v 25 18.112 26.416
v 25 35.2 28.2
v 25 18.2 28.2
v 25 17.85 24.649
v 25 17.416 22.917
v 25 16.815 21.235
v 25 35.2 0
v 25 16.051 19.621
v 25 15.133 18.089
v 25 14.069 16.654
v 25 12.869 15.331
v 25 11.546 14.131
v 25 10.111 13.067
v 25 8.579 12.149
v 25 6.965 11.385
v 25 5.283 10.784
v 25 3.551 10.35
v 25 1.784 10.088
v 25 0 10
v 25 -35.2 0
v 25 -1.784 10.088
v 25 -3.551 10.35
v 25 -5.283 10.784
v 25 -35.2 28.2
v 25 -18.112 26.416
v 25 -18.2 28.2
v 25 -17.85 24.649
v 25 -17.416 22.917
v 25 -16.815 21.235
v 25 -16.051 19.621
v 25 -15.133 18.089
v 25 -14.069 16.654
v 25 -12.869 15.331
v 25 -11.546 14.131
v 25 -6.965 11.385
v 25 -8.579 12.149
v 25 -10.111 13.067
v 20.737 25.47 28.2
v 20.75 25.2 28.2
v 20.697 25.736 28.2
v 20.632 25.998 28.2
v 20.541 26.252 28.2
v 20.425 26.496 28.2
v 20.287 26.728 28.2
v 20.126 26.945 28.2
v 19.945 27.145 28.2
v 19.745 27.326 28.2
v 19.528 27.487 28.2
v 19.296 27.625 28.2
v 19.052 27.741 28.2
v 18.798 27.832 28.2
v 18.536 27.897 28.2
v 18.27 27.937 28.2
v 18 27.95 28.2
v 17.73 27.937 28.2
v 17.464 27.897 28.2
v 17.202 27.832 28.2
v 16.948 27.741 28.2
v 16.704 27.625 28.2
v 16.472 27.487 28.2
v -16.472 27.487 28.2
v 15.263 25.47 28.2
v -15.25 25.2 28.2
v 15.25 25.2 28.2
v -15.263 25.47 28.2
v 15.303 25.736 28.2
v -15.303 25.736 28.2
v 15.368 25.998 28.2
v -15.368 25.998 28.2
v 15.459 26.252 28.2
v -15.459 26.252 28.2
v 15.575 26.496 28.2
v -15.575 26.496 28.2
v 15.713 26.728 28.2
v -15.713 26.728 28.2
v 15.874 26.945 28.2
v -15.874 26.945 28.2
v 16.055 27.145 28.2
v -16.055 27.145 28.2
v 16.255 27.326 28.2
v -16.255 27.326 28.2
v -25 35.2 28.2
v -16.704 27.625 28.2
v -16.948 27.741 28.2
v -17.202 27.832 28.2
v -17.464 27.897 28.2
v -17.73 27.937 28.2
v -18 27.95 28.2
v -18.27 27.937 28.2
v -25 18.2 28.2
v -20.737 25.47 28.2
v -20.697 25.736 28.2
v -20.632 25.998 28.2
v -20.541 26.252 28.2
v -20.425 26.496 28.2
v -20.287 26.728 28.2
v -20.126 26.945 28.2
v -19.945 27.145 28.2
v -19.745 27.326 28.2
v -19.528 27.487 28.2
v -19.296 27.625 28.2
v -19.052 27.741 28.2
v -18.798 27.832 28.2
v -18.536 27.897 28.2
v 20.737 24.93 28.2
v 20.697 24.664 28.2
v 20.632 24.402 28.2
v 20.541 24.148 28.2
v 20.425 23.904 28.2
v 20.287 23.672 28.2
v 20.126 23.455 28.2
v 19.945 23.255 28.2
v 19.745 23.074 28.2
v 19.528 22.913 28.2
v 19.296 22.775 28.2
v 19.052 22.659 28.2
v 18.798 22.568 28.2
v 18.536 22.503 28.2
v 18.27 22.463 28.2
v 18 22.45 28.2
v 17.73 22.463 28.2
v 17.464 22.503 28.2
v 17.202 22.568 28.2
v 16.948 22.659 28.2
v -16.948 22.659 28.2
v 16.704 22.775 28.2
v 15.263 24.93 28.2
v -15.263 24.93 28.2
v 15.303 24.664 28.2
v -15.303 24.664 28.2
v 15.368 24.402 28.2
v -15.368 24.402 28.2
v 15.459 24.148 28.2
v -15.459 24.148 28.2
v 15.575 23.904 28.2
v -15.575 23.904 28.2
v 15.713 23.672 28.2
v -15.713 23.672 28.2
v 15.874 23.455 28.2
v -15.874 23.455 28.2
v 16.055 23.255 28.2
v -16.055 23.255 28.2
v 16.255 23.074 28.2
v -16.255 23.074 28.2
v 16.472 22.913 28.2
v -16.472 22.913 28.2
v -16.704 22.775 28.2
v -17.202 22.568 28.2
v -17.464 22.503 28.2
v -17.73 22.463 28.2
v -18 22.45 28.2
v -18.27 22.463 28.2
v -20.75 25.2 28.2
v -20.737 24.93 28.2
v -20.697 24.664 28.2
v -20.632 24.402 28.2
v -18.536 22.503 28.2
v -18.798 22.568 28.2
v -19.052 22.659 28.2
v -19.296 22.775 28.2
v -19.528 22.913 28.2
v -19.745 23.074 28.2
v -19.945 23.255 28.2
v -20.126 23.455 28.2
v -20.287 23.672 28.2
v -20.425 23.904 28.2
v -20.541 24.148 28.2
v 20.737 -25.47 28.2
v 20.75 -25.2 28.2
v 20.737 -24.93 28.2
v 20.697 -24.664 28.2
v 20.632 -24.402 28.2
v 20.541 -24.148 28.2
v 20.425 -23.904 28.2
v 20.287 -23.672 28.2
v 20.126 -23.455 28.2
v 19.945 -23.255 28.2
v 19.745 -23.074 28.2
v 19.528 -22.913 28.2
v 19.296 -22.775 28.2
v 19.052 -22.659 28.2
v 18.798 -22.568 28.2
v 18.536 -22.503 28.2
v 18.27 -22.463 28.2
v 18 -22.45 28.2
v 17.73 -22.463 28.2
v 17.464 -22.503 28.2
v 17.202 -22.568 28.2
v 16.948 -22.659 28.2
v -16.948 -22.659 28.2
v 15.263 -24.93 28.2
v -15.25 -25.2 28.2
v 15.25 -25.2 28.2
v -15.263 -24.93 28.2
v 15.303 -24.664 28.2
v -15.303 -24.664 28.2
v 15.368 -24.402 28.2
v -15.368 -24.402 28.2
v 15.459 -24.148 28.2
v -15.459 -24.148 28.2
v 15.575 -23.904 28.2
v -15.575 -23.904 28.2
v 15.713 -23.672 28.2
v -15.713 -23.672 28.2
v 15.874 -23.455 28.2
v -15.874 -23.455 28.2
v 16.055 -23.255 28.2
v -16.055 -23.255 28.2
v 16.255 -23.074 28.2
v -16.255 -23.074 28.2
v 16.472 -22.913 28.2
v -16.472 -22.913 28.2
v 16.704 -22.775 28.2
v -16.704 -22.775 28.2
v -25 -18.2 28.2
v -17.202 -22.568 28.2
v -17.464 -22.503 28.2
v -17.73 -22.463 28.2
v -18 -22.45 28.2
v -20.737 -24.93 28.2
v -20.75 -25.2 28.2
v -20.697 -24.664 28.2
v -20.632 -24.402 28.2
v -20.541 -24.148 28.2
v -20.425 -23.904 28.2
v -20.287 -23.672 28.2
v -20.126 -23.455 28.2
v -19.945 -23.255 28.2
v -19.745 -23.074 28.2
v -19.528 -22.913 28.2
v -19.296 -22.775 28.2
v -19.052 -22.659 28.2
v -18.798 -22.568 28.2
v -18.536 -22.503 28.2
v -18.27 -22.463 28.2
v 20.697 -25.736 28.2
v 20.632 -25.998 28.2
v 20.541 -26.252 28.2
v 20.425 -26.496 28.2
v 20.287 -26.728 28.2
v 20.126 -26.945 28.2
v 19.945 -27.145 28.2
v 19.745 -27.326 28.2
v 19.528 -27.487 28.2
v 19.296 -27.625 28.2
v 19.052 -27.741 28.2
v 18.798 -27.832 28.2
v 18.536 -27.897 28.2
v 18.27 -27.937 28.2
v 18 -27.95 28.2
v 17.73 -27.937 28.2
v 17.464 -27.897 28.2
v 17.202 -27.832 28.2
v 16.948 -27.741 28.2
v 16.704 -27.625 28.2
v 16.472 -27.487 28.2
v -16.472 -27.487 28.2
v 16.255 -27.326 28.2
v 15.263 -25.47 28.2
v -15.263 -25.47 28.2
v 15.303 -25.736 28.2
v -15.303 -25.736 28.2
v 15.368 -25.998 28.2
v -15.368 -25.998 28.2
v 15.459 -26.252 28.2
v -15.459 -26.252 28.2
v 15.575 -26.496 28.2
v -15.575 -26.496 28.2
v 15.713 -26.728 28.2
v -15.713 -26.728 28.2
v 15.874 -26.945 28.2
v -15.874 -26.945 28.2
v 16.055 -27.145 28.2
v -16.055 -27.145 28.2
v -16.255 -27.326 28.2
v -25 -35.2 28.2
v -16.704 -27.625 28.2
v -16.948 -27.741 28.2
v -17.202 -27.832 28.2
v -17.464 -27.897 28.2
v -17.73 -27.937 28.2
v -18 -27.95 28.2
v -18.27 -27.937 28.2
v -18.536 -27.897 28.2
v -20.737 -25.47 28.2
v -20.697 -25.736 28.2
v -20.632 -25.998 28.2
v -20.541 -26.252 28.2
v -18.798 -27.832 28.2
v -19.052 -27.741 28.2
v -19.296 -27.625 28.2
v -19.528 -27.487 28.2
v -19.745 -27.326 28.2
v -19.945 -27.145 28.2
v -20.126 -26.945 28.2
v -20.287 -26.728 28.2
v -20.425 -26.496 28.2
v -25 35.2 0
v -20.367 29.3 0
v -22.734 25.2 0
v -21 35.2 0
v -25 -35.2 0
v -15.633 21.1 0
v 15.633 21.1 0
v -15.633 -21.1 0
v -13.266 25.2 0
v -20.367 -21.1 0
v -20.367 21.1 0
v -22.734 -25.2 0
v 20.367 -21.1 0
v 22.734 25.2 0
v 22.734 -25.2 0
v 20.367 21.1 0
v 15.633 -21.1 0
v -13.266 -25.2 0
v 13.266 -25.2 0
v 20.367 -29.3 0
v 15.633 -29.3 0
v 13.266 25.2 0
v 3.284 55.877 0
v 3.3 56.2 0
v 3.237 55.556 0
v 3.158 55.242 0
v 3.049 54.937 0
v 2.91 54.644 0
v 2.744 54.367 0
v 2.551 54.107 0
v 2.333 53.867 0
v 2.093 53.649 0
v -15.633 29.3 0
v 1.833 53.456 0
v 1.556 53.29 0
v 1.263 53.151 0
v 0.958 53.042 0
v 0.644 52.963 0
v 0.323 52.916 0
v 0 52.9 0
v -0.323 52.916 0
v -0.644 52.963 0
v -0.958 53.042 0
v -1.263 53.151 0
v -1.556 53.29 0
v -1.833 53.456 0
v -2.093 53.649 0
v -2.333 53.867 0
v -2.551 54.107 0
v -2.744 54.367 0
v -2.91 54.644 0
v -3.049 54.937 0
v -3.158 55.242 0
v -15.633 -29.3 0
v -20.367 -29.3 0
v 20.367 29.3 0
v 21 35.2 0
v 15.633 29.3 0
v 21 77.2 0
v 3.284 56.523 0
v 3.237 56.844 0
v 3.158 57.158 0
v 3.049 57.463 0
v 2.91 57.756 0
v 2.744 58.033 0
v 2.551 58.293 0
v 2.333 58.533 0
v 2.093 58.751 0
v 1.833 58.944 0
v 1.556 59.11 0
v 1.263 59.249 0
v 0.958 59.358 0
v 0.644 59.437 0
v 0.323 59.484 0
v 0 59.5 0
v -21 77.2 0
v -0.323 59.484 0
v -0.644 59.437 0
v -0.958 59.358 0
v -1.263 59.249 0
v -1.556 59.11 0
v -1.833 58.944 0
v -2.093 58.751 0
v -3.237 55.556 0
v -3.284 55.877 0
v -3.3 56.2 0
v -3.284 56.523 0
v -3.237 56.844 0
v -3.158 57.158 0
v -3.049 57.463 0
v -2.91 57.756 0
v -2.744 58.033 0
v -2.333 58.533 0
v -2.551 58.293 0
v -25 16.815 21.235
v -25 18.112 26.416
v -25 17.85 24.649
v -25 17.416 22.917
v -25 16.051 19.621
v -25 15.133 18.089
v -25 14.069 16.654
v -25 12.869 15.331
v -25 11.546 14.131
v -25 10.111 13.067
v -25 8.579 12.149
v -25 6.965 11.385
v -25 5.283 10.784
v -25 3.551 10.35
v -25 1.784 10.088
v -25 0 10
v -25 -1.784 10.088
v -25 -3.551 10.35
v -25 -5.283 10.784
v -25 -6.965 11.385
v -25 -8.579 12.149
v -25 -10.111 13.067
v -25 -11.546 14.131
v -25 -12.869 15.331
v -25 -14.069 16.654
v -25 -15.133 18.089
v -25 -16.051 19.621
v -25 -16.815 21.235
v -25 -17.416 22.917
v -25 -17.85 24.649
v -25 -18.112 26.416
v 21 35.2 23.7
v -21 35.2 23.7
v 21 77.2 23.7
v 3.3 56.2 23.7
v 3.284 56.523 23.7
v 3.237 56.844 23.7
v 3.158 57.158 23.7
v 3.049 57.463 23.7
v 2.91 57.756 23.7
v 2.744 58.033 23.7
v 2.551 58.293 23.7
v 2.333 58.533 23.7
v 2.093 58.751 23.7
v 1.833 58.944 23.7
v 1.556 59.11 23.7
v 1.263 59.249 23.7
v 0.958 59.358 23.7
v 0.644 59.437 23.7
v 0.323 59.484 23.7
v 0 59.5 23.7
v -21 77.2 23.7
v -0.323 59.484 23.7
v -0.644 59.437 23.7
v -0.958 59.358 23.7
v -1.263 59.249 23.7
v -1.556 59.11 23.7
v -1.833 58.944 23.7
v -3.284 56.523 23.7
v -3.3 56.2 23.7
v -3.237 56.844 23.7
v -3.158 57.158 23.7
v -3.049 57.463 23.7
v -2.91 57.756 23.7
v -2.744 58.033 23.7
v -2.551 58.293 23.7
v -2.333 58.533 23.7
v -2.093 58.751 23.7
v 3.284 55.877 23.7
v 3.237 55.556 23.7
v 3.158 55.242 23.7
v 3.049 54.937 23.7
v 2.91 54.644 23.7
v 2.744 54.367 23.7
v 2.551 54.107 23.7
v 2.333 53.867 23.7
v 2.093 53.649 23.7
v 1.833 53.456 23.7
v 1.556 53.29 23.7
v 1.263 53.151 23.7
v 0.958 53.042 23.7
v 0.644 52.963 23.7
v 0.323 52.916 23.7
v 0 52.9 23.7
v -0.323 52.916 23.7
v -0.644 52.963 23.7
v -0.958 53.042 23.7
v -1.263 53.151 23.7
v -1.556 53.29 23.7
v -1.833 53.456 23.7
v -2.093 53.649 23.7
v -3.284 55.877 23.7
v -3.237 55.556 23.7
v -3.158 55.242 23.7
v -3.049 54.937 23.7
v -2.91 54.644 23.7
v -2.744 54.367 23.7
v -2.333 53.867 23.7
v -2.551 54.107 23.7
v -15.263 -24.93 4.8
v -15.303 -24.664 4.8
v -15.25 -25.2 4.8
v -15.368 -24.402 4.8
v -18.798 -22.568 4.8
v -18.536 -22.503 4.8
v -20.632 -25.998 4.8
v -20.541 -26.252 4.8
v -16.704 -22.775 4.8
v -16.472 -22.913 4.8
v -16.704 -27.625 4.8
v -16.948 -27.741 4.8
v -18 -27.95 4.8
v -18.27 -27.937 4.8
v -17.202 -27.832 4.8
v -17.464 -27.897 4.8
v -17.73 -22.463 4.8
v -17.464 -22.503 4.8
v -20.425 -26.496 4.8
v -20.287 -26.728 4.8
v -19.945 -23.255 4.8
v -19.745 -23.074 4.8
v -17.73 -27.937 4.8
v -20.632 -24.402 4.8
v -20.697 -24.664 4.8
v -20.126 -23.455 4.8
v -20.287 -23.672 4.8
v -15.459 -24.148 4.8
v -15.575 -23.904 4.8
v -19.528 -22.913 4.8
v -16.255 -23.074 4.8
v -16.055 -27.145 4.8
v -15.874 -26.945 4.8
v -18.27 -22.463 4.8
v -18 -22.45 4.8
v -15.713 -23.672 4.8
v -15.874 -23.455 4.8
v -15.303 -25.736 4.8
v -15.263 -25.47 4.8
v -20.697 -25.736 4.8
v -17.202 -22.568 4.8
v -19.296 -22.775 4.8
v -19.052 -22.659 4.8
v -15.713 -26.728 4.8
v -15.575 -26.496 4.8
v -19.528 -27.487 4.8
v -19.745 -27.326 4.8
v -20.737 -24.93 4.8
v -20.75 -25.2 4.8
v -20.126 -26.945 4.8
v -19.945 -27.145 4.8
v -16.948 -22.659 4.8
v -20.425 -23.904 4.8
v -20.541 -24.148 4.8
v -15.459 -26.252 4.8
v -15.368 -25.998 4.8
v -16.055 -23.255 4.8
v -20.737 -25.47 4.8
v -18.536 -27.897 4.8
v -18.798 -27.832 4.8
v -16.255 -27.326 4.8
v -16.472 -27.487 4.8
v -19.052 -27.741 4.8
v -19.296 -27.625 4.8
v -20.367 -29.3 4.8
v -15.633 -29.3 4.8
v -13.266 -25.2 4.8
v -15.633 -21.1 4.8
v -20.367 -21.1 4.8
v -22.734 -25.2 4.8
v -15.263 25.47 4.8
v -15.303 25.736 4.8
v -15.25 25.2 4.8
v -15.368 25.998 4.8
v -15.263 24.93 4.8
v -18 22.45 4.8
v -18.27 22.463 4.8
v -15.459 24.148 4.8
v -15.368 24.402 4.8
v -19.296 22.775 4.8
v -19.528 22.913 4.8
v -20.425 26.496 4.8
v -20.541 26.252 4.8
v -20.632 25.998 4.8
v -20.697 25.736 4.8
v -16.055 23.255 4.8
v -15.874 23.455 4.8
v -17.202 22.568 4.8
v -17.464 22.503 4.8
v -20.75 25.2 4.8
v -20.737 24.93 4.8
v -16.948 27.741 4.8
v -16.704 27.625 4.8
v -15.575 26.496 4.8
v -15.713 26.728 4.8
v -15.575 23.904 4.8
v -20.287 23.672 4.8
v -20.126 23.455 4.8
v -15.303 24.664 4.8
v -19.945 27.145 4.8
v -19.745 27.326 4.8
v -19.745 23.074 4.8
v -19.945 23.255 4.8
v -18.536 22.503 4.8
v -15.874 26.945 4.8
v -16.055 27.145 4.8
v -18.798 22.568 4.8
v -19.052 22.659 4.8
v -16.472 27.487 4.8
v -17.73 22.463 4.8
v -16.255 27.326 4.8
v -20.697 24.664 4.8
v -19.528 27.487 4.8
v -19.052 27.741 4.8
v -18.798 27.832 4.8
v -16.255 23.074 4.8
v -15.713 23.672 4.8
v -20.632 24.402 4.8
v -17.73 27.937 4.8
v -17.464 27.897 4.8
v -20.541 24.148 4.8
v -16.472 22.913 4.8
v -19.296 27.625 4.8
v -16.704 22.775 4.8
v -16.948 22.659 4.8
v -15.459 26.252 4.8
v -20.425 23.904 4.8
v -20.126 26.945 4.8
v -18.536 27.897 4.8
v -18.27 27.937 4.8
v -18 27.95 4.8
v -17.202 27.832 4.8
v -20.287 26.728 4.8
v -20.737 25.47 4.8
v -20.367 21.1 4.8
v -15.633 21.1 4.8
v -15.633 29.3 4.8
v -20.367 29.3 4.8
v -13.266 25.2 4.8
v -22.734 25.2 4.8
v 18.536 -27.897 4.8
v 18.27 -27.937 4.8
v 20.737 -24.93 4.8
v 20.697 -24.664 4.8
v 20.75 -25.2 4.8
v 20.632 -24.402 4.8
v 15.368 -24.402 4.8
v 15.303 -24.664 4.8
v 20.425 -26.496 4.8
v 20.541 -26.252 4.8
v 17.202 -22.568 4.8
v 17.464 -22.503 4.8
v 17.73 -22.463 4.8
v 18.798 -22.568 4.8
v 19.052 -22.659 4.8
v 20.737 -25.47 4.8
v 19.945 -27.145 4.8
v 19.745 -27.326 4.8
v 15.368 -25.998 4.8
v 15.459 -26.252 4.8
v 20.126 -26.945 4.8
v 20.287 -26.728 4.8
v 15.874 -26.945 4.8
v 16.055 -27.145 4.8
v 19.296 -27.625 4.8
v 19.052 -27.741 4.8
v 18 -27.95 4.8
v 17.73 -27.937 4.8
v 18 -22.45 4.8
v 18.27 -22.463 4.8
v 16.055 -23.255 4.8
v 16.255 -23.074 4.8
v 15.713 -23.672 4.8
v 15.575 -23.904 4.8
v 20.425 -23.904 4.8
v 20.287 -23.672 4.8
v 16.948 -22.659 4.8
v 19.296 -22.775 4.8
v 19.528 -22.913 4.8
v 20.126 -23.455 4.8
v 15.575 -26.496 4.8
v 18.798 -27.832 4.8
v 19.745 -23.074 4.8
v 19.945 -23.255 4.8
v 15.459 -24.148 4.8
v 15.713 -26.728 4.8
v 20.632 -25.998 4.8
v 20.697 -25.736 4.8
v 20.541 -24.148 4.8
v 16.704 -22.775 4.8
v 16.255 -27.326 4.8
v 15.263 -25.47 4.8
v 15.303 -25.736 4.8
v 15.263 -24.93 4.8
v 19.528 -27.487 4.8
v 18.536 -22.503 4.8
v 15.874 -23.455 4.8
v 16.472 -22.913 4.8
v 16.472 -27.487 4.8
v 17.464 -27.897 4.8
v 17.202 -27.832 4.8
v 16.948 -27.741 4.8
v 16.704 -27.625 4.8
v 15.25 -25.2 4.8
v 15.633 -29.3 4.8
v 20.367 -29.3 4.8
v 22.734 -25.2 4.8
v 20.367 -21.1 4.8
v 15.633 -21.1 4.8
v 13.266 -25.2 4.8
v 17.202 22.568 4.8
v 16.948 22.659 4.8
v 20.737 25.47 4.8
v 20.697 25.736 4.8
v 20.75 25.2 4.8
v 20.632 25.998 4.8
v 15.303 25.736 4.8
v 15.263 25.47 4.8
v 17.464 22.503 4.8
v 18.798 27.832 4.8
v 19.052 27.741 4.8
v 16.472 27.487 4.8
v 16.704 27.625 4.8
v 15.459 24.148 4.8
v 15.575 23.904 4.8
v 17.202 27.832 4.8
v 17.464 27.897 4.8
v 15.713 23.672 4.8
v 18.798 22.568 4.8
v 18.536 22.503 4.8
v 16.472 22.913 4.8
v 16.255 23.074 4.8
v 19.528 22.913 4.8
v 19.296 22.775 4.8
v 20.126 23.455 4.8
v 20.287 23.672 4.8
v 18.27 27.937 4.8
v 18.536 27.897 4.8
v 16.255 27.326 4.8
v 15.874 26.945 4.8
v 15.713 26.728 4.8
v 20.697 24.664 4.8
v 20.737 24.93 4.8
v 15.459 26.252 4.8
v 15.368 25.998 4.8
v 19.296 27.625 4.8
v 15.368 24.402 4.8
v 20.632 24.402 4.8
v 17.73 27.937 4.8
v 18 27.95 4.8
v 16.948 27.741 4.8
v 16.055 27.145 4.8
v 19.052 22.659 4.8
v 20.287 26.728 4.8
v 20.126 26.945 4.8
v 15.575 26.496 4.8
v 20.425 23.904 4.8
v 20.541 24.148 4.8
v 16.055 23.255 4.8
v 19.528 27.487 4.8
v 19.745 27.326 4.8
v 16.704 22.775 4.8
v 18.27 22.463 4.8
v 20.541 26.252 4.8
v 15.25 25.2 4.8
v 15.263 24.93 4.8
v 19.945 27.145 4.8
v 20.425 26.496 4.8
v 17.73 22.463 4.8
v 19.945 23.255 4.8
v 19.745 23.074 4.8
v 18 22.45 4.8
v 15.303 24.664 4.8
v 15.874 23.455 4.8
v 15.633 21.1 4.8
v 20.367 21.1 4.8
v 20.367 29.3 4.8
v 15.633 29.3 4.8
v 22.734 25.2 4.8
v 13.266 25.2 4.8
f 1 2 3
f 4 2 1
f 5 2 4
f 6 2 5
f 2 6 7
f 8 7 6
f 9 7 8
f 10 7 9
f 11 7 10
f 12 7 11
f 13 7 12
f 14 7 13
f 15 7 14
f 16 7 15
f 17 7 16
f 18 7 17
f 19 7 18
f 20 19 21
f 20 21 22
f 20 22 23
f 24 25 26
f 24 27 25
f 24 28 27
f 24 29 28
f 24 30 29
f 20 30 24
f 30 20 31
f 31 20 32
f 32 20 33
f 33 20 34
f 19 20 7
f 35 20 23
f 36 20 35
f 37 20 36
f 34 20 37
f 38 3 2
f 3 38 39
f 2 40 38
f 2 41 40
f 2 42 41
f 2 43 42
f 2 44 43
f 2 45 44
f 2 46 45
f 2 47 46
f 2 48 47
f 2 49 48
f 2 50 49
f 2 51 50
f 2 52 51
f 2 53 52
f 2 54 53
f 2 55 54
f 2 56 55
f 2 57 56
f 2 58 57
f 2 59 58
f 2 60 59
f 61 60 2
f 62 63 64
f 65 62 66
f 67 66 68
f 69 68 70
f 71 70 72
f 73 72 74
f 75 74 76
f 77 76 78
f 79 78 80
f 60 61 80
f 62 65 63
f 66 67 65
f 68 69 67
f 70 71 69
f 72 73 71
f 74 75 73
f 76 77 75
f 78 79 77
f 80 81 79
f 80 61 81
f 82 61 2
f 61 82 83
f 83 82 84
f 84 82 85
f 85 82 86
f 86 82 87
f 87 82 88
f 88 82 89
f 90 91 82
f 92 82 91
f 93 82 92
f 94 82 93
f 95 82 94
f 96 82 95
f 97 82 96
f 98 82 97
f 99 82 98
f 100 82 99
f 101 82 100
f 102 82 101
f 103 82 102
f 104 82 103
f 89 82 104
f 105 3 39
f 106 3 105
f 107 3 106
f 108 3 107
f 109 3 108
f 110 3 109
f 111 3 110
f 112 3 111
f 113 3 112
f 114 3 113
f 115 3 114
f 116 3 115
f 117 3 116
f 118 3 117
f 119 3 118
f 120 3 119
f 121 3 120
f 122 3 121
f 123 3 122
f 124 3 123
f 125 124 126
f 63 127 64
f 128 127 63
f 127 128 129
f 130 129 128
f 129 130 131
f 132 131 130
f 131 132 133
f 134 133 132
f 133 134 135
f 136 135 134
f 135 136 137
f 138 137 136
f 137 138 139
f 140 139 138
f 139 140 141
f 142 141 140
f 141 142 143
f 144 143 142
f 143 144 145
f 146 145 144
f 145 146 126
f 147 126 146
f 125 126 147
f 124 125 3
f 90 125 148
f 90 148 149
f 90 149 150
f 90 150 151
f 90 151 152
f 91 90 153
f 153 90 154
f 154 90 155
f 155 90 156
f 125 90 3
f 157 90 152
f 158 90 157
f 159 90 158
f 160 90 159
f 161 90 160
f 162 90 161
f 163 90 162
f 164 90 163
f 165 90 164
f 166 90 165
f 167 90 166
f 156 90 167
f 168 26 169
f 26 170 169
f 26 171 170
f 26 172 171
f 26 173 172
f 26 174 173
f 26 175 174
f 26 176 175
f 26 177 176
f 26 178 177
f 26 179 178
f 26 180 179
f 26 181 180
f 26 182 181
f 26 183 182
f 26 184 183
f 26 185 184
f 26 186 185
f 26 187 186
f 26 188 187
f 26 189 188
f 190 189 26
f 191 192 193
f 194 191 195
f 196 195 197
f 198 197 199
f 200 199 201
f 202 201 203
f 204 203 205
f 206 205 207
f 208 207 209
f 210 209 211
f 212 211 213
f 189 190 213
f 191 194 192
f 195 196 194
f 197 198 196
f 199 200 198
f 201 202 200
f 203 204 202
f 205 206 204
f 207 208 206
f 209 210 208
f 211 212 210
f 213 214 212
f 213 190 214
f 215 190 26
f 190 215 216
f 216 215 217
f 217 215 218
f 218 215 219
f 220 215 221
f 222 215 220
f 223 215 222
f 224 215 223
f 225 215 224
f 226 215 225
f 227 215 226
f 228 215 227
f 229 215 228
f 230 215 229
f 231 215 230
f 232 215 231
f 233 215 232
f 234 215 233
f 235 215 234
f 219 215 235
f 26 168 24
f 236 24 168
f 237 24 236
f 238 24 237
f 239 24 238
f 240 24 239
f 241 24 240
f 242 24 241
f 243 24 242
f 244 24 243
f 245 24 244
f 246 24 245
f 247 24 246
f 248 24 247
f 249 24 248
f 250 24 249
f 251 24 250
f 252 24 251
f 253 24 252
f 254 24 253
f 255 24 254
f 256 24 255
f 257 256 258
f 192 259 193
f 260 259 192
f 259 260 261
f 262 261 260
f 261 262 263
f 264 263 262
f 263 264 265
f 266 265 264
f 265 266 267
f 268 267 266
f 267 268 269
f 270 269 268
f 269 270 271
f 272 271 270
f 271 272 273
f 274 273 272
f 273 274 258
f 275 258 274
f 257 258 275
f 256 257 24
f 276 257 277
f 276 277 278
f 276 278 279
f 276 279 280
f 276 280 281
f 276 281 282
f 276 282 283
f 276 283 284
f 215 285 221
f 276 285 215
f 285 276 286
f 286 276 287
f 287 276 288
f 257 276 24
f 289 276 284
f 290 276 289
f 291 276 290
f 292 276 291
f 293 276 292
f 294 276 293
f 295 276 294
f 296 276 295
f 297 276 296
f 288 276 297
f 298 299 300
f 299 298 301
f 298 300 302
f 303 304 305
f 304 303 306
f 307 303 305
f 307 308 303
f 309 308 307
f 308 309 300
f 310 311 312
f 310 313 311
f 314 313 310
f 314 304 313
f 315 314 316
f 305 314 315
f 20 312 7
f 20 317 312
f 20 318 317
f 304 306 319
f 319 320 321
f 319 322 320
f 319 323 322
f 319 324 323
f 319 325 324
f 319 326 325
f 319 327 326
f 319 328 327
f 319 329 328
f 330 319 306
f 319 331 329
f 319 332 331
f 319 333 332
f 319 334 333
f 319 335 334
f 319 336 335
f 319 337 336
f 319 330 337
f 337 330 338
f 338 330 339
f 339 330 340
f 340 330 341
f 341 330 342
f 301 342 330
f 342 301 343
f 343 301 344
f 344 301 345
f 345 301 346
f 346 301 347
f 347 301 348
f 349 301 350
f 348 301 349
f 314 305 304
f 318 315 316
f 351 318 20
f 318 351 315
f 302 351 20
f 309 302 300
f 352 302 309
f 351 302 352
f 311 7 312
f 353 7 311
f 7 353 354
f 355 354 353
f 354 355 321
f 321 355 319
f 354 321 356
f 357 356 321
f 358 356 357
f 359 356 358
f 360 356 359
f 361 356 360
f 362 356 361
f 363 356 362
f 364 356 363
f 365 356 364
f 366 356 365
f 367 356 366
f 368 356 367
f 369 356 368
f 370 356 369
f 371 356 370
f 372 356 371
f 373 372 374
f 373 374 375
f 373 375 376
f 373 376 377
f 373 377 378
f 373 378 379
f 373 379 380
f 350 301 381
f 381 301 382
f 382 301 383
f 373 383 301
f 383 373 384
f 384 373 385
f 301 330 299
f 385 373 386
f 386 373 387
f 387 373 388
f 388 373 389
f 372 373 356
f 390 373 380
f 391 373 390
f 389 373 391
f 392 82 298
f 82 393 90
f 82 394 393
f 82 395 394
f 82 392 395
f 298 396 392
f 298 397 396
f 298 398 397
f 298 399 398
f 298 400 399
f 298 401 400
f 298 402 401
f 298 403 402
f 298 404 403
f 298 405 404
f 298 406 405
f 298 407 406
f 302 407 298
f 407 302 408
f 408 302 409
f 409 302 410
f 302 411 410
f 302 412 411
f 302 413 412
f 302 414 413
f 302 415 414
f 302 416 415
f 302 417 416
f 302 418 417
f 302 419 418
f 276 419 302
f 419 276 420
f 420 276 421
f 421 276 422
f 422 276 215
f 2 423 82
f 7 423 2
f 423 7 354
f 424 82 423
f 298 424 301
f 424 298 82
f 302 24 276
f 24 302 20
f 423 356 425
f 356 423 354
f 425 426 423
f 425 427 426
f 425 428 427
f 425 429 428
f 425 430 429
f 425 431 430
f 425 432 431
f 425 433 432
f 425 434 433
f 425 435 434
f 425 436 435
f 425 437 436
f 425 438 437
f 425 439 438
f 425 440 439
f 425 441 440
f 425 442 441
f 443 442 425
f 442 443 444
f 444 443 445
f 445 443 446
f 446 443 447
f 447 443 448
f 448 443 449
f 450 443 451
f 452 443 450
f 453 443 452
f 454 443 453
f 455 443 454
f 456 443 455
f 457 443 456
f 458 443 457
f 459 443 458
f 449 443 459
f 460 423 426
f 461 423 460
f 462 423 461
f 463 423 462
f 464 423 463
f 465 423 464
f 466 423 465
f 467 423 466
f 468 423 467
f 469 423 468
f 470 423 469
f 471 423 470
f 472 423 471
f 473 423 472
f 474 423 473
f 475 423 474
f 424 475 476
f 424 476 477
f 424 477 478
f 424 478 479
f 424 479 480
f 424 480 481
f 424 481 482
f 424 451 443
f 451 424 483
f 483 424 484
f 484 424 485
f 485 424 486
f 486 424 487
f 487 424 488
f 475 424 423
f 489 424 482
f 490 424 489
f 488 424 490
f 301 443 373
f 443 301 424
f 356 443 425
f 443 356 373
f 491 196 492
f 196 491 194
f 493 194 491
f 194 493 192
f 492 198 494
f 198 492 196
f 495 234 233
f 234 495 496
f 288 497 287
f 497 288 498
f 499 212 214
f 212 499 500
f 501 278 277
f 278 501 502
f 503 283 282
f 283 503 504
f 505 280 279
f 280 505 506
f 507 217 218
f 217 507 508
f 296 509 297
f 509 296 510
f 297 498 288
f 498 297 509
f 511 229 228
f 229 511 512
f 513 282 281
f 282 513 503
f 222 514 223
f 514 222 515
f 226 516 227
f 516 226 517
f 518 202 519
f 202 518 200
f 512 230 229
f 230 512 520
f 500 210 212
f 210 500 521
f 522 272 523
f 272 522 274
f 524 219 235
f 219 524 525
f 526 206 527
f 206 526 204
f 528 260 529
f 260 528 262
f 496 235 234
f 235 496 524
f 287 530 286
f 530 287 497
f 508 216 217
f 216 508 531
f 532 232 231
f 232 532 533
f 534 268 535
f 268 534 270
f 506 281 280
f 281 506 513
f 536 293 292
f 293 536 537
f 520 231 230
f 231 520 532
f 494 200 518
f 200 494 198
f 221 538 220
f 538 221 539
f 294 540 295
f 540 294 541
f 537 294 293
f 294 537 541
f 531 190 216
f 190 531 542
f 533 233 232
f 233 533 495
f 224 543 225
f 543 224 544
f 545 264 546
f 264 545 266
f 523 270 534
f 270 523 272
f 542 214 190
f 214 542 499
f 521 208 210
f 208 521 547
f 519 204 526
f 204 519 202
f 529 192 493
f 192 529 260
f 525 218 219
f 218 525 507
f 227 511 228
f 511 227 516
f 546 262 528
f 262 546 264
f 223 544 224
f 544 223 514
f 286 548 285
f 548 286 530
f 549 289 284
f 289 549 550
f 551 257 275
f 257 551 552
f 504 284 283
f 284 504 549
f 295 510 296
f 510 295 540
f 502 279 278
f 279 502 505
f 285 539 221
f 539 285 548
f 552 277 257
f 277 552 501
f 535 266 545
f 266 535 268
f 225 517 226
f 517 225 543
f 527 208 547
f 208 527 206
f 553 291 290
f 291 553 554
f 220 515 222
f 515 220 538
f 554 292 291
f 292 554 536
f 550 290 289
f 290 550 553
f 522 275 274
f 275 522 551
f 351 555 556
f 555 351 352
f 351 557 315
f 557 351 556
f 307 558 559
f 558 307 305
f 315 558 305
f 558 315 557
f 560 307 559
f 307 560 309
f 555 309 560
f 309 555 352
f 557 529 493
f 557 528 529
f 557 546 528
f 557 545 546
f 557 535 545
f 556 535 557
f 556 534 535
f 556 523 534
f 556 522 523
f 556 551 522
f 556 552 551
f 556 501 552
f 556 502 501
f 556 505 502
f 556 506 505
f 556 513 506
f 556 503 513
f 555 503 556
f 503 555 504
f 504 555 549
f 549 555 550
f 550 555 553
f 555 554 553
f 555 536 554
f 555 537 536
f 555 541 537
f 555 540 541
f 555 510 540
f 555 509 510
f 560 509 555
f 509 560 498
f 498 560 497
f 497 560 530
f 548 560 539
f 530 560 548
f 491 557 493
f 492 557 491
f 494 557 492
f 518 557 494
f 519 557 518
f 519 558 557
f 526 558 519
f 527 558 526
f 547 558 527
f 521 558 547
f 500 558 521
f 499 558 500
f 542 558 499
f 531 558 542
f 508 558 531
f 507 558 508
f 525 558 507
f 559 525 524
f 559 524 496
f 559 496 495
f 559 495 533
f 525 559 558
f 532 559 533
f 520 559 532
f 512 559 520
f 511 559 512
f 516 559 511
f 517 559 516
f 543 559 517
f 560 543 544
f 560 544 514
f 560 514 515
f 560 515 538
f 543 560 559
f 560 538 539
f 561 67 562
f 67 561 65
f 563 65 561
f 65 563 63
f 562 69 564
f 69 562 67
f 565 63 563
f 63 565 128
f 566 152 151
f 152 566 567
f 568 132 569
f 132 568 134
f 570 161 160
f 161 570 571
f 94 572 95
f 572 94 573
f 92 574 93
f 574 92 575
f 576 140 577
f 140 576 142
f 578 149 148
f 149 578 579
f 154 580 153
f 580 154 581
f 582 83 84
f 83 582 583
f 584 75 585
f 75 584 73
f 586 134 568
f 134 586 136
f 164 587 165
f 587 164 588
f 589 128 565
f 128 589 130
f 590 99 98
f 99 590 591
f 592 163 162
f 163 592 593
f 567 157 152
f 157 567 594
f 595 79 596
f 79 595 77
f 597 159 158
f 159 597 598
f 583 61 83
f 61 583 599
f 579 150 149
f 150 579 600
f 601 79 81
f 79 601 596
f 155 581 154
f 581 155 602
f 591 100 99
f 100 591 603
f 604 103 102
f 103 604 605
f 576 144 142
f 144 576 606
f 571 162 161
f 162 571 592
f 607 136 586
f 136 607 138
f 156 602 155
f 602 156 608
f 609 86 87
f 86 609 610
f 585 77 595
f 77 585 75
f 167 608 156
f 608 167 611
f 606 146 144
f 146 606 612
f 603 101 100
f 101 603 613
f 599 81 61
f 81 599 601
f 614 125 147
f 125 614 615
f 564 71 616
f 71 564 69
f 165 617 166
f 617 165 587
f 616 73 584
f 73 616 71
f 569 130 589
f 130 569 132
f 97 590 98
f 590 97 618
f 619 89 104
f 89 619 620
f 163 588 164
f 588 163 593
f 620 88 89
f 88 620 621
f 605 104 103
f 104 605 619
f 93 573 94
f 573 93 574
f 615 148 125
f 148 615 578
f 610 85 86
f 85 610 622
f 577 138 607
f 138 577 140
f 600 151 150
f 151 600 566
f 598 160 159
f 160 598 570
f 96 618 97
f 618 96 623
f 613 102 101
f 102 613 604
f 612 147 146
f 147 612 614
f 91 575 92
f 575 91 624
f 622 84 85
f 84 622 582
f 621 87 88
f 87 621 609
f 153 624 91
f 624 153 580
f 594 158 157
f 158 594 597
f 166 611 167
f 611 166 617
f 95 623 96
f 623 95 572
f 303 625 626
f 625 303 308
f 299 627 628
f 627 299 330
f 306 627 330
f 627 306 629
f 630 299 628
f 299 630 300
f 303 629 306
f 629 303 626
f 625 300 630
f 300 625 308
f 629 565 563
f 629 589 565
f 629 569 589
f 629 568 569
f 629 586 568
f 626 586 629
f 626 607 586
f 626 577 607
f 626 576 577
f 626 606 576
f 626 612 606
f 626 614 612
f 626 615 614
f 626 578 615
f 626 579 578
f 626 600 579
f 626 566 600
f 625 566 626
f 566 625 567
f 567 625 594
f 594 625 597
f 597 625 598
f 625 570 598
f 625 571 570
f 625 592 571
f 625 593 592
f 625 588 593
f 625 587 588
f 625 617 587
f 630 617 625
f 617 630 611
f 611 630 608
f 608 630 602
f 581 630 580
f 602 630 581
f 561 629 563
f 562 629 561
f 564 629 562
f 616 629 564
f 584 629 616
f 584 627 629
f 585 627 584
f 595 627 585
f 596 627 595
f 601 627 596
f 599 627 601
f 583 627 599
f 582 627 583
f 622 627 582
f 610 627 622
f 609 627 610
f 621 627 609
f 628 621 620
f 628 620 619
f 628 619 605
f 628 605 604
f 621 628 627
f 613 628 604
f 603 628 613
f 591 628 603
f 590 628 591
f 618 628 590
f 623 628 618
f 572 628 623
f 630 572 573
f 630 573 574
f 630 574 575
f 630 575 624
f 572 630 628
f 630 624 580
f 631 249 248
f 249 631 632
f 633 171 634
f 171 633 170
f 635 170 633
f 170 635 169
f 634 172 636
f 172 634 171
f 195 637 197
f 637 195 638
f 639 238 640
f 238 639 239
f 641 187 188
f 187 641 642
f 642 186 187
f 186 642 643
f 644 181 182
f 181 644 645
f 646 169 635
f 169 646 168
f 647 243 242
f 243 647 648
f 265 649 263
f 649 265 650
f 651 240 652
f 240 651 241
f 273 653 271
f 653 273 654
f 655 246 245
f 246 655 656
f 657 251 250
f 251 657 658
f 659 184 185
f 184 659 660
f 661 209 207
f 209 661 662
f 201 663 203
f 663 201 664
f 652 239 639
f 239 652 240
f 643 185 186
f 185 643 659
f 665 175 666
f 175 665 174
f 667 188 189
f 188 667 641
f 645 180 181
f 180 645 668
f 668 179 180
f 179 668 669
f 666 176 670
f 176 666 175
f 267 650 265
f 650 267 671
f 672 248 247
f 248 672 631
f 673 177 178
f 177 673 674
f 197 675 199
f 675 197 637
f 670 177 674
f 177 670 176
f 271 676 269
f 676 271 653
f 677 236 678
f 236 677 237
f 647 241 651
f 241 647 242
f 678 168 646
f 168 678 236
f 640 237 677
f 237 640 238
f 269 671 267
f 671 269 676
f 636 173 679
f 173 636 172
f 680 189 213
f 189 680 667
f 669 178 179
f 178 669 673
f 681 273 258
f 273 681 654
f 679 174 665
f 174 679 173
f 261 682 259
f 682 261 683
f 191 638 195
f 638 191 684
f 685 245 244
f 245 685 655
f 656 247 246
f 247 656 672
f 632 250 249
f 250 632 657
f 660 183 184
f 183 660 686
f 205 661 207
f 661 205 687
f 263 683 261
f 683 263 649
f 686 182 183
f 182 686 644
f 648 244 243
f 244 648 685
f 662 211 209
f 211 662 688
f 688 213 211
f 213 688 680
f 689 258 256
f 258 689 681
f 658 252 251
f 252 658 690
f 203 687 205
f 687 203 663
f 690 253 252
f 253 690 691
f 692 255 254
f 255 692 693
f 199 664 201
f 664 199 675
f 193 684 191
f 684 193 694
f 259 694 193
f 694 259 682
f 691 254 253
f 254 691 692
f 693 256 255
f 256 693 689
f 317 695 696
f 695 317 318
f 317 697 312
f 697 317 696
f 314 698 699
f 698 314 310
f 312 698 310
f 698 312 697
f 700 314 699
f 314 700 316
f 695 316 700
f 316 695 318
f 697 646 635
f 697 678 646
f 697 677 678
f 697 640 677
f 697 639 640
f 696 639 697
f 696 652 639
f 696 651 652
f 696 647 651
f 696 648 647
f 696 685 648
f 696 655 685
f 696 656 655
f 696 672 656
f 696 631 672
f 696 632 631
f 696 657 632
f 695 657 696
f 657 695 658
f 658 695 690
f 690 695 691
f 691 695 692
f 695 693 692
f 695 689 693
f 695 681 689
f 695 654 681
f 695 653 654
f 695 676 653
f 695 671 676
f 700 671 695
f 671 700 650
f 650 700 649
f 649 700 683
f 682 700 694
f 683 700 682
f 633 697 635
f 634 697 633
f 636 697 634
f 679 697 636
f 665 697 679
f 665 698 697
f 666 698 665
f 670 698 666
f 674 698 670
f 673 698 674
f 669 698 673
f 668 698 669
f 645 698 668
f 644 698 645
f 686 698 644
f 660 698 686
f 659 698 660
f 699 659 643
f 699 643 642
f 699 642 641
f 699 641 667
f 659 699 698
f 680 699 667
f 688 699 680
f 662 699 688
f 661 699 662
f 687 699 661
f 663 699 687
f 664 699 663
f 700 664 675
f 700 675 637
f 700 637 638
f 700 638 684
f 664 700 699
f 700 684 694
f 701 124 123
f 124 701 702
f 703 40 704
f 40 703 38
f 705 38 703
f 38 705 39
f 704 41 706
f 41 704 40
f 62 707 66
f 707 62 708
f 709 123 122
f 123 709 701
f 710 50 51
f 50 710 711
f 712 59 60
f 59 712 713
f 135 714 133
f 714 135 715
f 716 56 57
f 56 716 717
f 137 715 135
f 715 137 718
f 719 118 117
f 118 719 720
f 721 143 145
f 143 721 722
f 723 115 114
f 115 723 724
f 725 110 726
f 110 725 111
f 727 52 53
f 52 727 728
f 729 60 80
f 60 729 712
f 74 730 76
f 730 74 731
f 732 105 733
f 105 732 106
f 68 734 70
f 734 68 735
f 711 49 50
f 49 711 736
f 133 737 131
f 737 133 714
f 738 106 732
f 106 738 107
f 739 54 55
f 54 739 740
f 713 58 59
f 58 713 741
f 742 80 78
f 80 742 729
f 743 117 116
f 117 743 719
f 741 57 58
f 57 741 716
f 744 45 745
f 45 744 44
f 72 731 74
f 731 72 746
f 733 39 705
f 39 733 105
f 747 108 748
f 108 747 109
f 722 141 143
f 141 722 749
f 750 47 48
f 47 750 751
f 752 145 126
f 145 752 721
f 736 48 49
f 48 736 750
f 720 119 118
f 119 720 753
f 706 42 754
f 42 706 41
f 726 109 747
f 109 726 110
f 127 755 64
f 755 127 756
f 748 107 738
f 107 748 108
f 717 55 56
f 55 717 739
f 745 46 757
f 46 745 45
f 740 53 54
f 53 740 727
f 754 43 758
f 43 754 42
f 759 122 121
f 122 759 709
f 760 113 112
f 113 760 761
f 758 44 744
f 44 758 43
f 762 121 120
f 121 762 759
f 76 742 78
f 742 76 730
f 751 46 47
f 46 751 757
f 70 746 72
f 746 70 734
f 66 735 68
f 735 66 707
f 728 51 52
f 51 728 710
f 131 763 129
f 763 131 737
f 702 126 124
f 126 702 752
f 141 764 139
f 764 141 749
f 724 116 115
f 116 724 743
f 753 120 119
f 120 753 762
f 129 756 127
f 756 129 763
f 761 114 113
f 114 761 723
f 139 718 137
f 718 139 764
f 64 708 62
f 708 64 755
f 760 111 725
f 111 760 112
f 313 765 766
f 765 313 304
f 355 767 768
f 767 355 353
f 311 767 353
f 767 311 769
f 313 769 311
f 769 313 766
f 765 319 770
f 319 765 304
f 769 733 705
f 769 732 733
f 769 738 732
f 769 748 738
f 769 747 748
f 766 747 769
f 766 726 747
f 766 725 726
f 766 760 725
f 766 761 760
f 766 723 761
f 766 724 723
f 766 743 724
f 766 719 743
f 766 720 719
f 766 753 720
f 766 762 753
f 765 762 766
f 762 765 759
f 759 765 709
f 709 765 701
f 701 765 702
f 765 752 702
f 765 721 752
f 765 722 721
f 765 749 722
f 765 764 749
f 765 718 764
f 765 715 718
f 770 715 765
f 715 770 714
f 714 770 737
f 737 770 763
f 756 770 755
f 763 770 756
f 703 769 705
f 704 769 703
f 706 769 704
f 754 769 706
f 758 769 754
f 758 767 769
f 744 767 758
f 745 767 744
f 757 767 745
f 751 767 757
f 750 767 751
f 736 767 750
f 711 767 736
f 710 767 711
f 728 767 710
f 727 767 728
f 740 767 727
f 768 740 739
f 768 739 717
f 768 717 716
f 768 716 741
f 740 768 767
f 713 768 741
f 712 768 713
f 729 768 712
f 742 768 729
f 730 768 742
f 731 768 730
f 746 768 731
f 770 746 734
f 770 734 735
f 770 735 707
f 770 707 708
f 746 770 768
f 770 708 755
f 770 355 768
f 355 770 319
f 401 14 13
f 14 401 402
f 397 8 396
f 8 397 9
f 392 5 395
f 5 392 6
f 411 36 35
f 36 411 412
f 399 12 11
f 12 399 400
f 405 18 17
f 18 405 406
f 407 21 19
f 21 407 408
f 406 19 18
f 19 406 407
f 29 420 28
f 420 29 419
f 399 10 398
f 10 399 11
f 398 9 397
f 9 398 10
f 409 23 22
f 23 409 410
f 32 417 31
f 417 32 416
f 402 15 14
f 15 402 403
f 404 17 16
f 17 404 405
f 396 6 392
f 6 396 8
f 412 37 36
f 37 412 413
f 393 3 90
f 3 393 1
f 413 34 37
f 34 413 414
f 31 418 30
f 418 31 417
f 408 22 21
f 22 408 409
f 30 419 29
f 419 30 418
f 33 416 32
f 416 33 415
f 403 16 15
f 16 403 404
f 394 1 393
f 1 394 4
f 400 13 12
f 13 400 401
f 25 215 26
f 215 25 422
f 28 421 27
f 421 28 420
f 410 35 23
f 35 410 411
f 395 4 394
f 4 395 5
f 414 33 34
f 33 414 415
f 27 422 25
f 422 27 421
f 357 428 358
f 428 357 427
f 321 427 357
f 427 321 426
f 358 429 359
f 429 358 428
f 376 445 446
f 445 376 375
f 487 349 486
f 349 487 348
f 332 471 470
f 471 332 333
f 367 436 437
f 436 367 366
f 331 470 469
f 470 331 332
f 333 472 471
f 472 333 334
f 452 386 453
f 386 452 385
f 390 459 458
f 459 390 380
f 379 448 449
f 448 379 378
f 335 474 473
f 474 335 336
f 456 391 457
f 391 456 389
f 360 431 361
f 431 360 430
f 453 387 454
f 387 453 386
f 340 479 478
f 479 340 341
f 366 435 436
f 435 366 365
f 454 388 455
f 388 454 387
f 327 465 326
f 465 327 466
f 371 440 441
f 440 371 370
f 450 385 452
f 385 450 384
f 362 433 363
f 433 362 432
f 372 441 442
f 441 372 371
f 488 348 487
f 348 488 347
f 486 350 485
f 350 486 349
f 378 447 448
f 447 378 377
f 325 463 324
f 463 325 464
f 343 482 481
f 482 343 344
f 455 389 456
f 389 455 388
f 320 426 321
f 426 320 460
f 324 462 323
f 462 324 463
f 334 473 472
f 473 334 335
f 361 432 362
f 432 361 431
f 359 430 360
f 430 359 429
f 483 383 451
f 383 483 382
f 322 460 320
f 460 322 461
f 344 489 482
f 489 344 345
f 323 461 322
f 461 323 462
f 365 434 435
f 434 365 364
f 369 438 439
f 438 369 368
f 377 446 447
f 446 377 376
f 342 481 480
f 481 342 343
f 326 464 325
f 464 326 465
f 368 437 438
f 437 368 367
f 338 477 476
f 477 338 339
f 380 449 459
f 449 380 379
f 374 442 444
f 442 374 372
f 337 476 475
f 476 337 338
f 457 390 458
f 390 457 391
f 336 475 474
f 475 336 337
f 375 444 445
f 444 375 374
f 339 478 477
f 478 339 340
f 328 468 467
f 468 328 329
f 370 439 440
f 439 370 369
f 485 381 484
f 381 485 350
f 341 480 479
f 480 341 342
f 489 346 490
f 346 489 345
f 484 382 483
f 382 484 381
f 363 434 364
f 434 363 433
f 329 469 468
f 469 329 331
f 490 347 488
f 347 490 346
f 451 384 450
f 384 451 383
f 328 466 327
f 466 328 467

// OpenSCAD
// file: common.scad
// Shared dimensions in mm; FDM fit allowances are design choices, not tolerances
// guaranteed by vendors. Exact mower model/serial and printer remain unknown.
// 76.2 x 38.1 rectangular rail is an UNVERIFIED selected envelope, not a
// specification for all TimeCutters (Toro also sells C-channel frames).
$fn = 64;
frame_rail_w = 76.2;                // depth wrapped by square U-bolt
frame_rail_h = 38.1;                // contact face width between U-bolt legs
frame_ubolt_inside_w = 40;
frame_ubolt_leg_nominal_d = 8;
frame_ubolt_center_pitch = frame_ubolt_inside_w + frame_ubolt_leg_nominal_d;
frame_ubolt_leg_hole_d = 9;
frame_ubolt_backing_t = 3;
frame_ubolt_washer_t = 2.4;
frame_ubolt_nut_h = 8;
frame_ubolt_thread_projection = 3;  // beyond full nut, not a second nut engagement
// Four-bolt printed steering-bar clamp. The 25.4 mm tube is only a coupon default;
// measure the actual lap-bar tube and tune its fit before printing working clamps.
clamp_tube_od_mm = 25.4;
clamp_tube_clearance_mm = 0.4;
clamp_shell_mm = 10;
clamp_bolt_x_mm = 18;
clamp_bolt_clear_mm = 5.5;          // four M5 clamp bolts
clamp_nut_af_mm = 8.2;
clamp_nut_depth_mm = 4.8;
clamp_pin_bore_mm = 6.6;
clamp_rod_eye_length_mm = 32;
clamp_rod_eye_width_mm = 20;
clamp_rod_eye_t_mm = 8;             // printed single-eye lug thickness
clamp_rod_gap_mm = 9;               // yoke clearance around the eye, nominally 0.5 mm per side
clamp_yoke_span_mm = 42;            // ear width clears the eye through its planar sweep
clamp_yoke_reach_mm = 42;           // total outboard yoke extension from the clamp body
clamp_yoke_root_overlap_mm = 4;     // fuse each printed ear into its half beyond the bar opening
clamp_yoke_sweep_clearance_mm = 1;
// ---- One clamp body, interchangeable split sleeves -------------------------------------
// The bore is FIXED at clamp_body_bore_mm and every sleeve is turned to that one OD, so the
// body, bolts, yoke and pin are printed once per side and never depend on the bar. The bar size
// is set by fitting a sleeve: the three gauge bores (tight/nominal/loose about the measured OD)
// ARE the installed sleeves, so the coupon that checked the bar is the coupon that gets fitted.
// Sleeve wall absorbs the difference, so a different bar - even one far from 25.4 mm - costs one
// small reprint, and the wall assert refuses a bar so close to the bore that the sleeve would be
// too thin to clamp.
clamp_sleeve_step_mm = 0.2;         // bore step between sleeves (matches the coupon family)
clamp_insert_clearance_mm = 0.3;    // sleeve OD to clamp bore, per side
clamp_insert_flange_t_mm = 2.5;     // end flange thickness; bears on the clamp end faces
clamp_insert_flange_grip_mm = 2.2;  // flange radial grip beyond the sleeve OD
clamp_insert_protrusion_mm = 3;     // sleeve tube projects past the body's end faces
clamp_insert_flange_gap_mm = 0.1;   // flange to body end face: retention with just fit clearance
// The clamp bore is FIXED and every sleeve is made to that one outside diameter, so the body,
// bolts, yoke and pin never depend on the bar: change clamp_tube_od_mm for a different bar and
// only the sleeve is reprinted, with the wall absorbing the difference. Raise the bore only if
// the wall assert fires - a bar too near the bore leaves a sleeve too thin to clamp.
clamp_body_bore_mm = 36.4;
clamp_insert_od_mm = clamp_body_bore_mm - 2*clamp_insert_clearance_mm;
function clamp_insert_bore_mm(index) =
    clamp_tube_od_mm + clamp_tube_clearance_mm + (index-1)*clamp_sleeve_step_mm;
function clamp_insert_wall_at_mm(index) = (clamp_insert_od_mm-clamp_insert_bore_mm(index))/2;
function clamp_insert_flange_od_mm(index) =
    clamp_insert_od_mm + 2*clamp_insert_flange_grip_mm;
function clamp_insert_reach_mm() = clamp_insert_flange_od_mm(0)/2;
clamp_r_mm = clamp_body_bore_mm / 2;
clamp_half_h_mm = clamp_r_mm + clamp_shell_mm;
clamp_bolt_y_mm = clamp_r_mm + 7;
clamp_w_mm = 2 * (clamp_bolt_y_mm + clamp_shell_mm);
clamp_l_mm = 2 * (clamp_bolt_x_mm + 7);
clamp_gauge_index = 1;

function clamp_rod_eye_sweep_radius_mm() =
    sqrt(pow(clamp_rod_eye_length_mm/2, 2) + pow(clamp_rod_eye_width_mm/2, 2));

// Exact listing's RDS51150 stationary-holder SIDE drawing, not bottom holes.
// RDS51150 vs purchased RDS51150SG revision must be confirmed with the coupon.
servo_side_hole_pitch = 24;
servo_side_hole_clear_d = 2.9;       // M2.5 with 0.4 mm diametral allowance
servo_side_tool_bore_d = 6;
m3_clear = 3.4;
m4_clear = 4.5;
m5_clear = 5.5;
m6_clear = 6.4;
m8_clear = 8.4;
wall = 5;
clearance = 0.4;

function frame_ubolt_required_leg_length(saddle_t) =
    frame_rail_w + saddle_t + frame_ubolt_backing_t + frame_ubolt_washer_t +
    frame_ubolt_nut_h + frame_ubolt_thread_projection;
function saddle_width(pitch, bore) = pitch + bore + 2 * wall;


module slot(d, len, h) {
    hull() for (x = [-len / 2, len / 2]) translate([x, 0, 0]) cylinder(h = h, d = d);
}
module plate(l, w, t, r = 6) {
    assert(l >= 2 * r && w >= 2 * r && t > 0);
    hull() for (x = [-1, 1], y = [-1, 1])
        translate([x * (l / 2 - r), y * (w / 2 - r), 0]) cylinder(h = t, r = r);
}
module frame_saddle(l, t, span, leg = frame_ubolt_leg_hole_d) {
    assert(l / 2 - span / 2 - leg / 2 >= 5, "U-bolt hole too near saddle end");
    plate(l, saddle_width(frame_ubolt_center_pitch, leg), t, 8);
}
module frame_ubolt_slots(t, span, leg = frame_ubolt_leg_hole_d) {
    for (x = [-1, 1], y = [-1, 1])
        translate([x * span / 2, y * frame_ubolt_center_pitch / 2, -1]) cylinder(h = t + 2, d = leg);
}
// main file
// FIRST-ARTICLE FIT / LOAD-TEST ONLY. Not powered-operation certified.
// Measure the actual lever tube OD with calipers; the default is only a sample
// coupon size. Printed-plastic clamp creep, fatigue, and torque capacity are unknown.
// Hand-cycle the linkage and inspect for slip, whitening, cracking, and loss of clamp
// after every test. Do not infer a safe bolt torque from this model; use no steel
// backing plate, but do not rely on that as evidence of operating safety.
//
// Local tube axis is X. The two mating halves split at Z=0 in the assembly.
// Four vertical M5 bolts occupy X=+/- clamp_bolt_x_mm, Y=+/- clamp_bolt_y_mm
// (2 longitudinal x 2 transverse). The mating rod pin axis is Z.
//
// Use from another file with: use <lapbar_four_bolt_clamp.scad>;
// Callable modules: clamp_anchor(), clamp_cap(), clamp_insert(), clamp_inserts_assembly(),
// clamp_gauge(), clamp_assembly(). The clamp bore is fixed; the sleeve sets the bar size.

include <common.scad>
clamp_part = "anchor";                 // anchor | cap | insert | gauge
clamp_insert_index = 1;                // sleeve size: 0 tight, 1 nominal, 2 loose
// Public assembly-space pin centre, before any per-bar clocking transform.
// lapbar_on_bar in assemblies.scad maps local +Z (this pin axis) to global +Y.
function clamp_pin_local() = [0, clamp_w_mm/2 + clamp_yoke_reach_mm/2, 0];
function clamp_tube_diameter_mm() = clamp_tube_od_mm;
function clamp_half_height_mm() = clamp_half_h_mm;
function clamp_width_mm() = clamp_w_mm;
function clamp_length_mm() = clamp_l_mm;
function clamp_bolt_x_mm_value() = clamp_bolt_x_mm;
function clamp_bolt_y_mm_value() = clamp_bolt_y_mm;

// Axis-X cylindrical groove is cut from one half of each print blank. Both mating
// faces remain flat and the groove leaves 4.25 mm nominal web to M5 hole edges.
module clamp_anchor() {
    assert(clamp_tube_od_mm > 0, "Measure tube OD and set clamp_tube_od_mm > 0");
    assert(clamp_bolt_y_mm - clamp_r_mm - clamp_bolt_clear_mm / 2 >= 4,
           "Increase transverse bolt offset for at least 4 mm groove-to-hole web");
    assert(clamp_rod_gap_mm >= clamp_rod_eye_t_mm+0.5,
           "Increase yoke gap/coupon clearance around the printed rod eye");
    assert(clamp_rod_gap_mm < 2*clamp_half_h_mm,
           "Yoke gap leaves insufficient material in the paired ears");
    assert(clamp_yoke_span_mm <= clamp_l_mm-8,
           "Widen clamp length for sound yoke-ear edge margins");
    assert(clamp_yoke_span_mm/2
           >= clamp_rod_eye_sweep_radius_mm()+clamp_yoke_sweep_clearance_mm,
           "Yoke span must clear the full planar eye sweep");
    assert(clamp_yoke_reach_mm/2
           >= clamp_rod_eye_sweep_radius_mm()+clamp_yoke_sweep_clearance_mm,
           "Yoke reach must clear the full planar eye sweep");
    assert(clamp_shell_mm-clamp_yoke_root_overlap_mm
           >= clamp_nut_af_mm/(2*cos(30))+1,
           "Yoke root intrudes into an M5 nut pocket; increase shell or reduce overlap");
    assert(clamp_half_h_mm <= 500, "Clamp height exceeds printer Z");
    assert(clamp_l_mm <= 420 && clamp_w_mm+clamp_yoke_reach_mm <= 420,
           "Clamp footprint exceeds 420 mm printer bed");
    clamp_anchor_print();
}

module clamp_anchor_print() {
    difference() {
        union() {
            translate([-clamp_l_mm/2,-clamp_w_mm/2,0])
                cube([clamp_l_mm,clamp_w_mm,clamp_half_h_mm]);
            // Lower yoke ear becomes the negative-Z/negative-Y clamp half at assembly.
            translate([-clamp_yoke_span_mm/2,
                       clamp_w_mm/2-clamp_yoke_root_overlap_mm,0])
                cube([clamp_yoke_span_mm,clamp_yoke_reach_mm+clamp_yoke_root_overlap_mm,
                      clamp_half_h_mm-clamp_rod_gap_mm/2]);
        }
        translate([-clamp_l_mm/2-1,0,clamp_half_h_mm])
            rotate([0,90,0]) cylinder(r=clamp_r_mm,h=clamp_l_mm+2);
        for(x=[-clamp_bolt_x_mm,clamp_bolt_x_mm],y=[-clamp_bolt_y_mm,clamp_bolt_y_mm]) {
            translate([x,y,-0.1]) cylinder(d=clamp_bolt_clear_mm,h=clamp_half_h_mm+0.2);
            translate([x,y,-0.1]) cylinder(d=clamp_nut_af_mm/cos(30),
                h=clamp_nut_depth_mm+0.1,$fn=6);
        }
        translate([0,clamp_pin_local()[1],-1])
            cylinder(d=clamp_pin_bore_mm,h=clamp_half_h_mm+2);
    }
}

module clamp_cap() {
    assert(clamp_tube_od_mm > 0, "Measure tube OD and set clamp_tube_od_mm > 0");
    assert(clamp_bolt_y_mm - clamp_r_mm - clamp_bolt_clear_mm / 2 >= 4,
           "Increase transverse bolt offset for at least 4 mm groove-to-hole web");
    assert(clamp_rod_gap_mm >= clamp_rod_eye_t_mm+0.5
           && clamp_rod_gap_mm < 2*clamp_half_h_mm,
           "Yoke opening must clear the rod eye while leaving two sound ears");
    assert(clamp_yoke_span_mm <= clamp_l_mm-8,
           "Widen clamp length for yoke-ear end margins");
    assert(clamp_yoke_span_mm/2
           >= clamp_rod_eye_sweep_radius_mm()+clamp_yoke_sweep_clearance_mm,
           "Yoke span must clear the full planar eye sweep");
    assert(clamp_yoke_reach_mm/2
           >= clamp_rod_eye_sweep_radius_mm()+clamp_yoke_sweep_clearance_mm,
           "Yoke reach must clear the full planar eye sweep");
    assert(clamp_shell_mm-clamp_yoke_root_overlap_mm
           >= clamp_nut_af_mm/(2*cos(30))+1,
           "Yoke root intrudes into an M5 nut pocket; increase shell or reduce overlap");
    assert(clamp_half_h_mm <= 500 && clamp_l_mm <= 420
           && clamp_w_mm+clamp_yoke_reach_mm <= 420,
           "Clamp cap exceeds the 420x420x500 printer envelope");
    clamp_cap_print();
}

module clamp_cap_print() {
    difference() {
        union() {
            translate([-clamp_l_mm/2,-clamp_w_mm/2,0])
                cube([clamp_l_mm,clamp_w_mm,clamp_half_h_mm]);
            // Upper yoke ear, paired with the lower anchor ear around the rod eye.
            translate([-clamp_yoke_span_mm/2,
                       clamp_w_mm/2-clamp_yoke_root_overlap_mm,
                       clamp_rod_gap_mm/2])
                cube([clamp_yoke_span_mm,clamp_yoke_reach_mm+clamp_yoke_root_overlap_mm,
                      clamp_half_h_mm-clamp_rod_gap_mm/2]);
        }
        translate([-clamp_l_mm/2-1,0,0])
            rotate([0,90,0]) cylinder(r=clamp_r_mm,h=clamp_l_mm+2);
        for(x=[-clamp_bolt_x_mm,clamp_bolt_x_mm],y=[-clamp_bolt_y_mm,clamp_bolt_y_mm])
            translate([x,y,-0.1]) cylinder(d=clamp_bolt_clear_mm,h=clamp_half_h_mm+0.2);
        translate([0,clamp_pin_local()[1],-1])
            cylinder(d=clamp_pin_bore_mm,h=clamp_half_h_mm+2);
    }
}

// Translate the print-oriented anchor down so its groove/nut pockets face the
// split plane and the cap/anchor bore halves align about the tube centre at z=0.
module clamp_assembly(index=clamp_insert_index) {
    translate([0,0,-clamp_half_h_mm]) clamp_anchor_print();
    clamp_cap_print();
    clamp_inserts_assembly(index);
}

// ---- Interchangeable split sleeve: one clamp body, several measured bar sizes -----------
// The clamp bore fits the LARGEST sleeve, so the body, bolts, yoke and pin are printed once
// per side whatever the bar measures. The bar size is set by fitting a sleeve: index 0/1/2 is
// the same tight/nominal/loose pair the gauge coupons sample, so the coupon that checked the
// bar is the coupon that gets fitted. ONE printed half serves both clamp halves - turn it
// 180 deg about the bar axis and its flanges land on the opposite end faces - so print two per
// side (four per mower) of the chosen size. Flanges bear on the clamp's end faces to stop the
// sleeve walking along the bar; they are not structural.
module clamp_insert_half(index=clamp_insert_index) {
    bore = clamp_insert_bore_mm(index);
    od = clamp_insert_od_mm;
    flange_od = clamp_insert_flange_od_mm(index);
    // The flanges are bumps ON the tube, which projects past the body's end faces. A flange
    // inside the body's length is wider than its bore and collides; one that merely touches the
    // tube's end face is a partial face-to-face union and comes out non-manifold. Overlapping it
    // in 3D on a longer tube is the only arrangement that is both clean and outside the body.
    tube_len = clamp_l_mm+2*clamp_insert_protrusion_mm;
    flange_in = clamp_l_mm/2+clamp_insert_flange_gap_mm;
    assert(index >= 0 && index <= 2, "clamp_insert_index must be 0, 1 or 2");
    assert(clamp_insert_wall_at_mm(index) >= 2.5,
           "Sleeve wall under 2.5 mm for this bar: raise clamp_body_bore_mm");
    assert(flange_od/2+clamp_bolt_clear_mm/2+1 <= clamp_bolt_y_mm,
           "Sleeve flange runs into an M5 bolt hole; increase clamp_bolt_y_mm");
    assert(flange_in+clamp_insert_flange_t_mm+0.2 <= tube_len/2,
           "Sleeve tube too short past the body for its flanges; raise clamp_insert_protrusion_mm");
    difference() {
        intersection() {
            union() {
                translate([-tube_len/2,0,0]) rotate([0,90,0])
                    difference() {
                        cylinder(d=od,h=tube_len);
                        translate([0,0,-1]) cylinder(d=bore,h=tube_len+2);
                    }
                for(x=[-flange_in-clamp_insert_flange_t_mm,flange_in])
                    translate([x,0,0]) rotate([0,90,0])
                        difference() {
                            cylinder(d=flange_od,h=clamp_insert_flange_t_mm);
                            translate([0,0,-1])
                                cylinder(d=bore,h=clamp_insert_flange_t_mm+2);
                        }
            }
            translate([-100,-100,-100]) cube([200,200,100]);   // keep the lower half only
        }
    }
}
// Print pose: the same solid lifted so its split face sits on the bed.
module clamp_insert(index=clamp_insert_index) {
    translate([0,0,clamp_insert_flange_od_mm(index)/2]) clamp_insert_half(index);
}
// A sleeve fitted to both clamp halves, in the clamp's own frame.
module clamp_inserts_assembly(index=clamp_insert_index) {
    clamp_insert_half(index);
    rotate([180,0,0]) clamp_insert_half(index);
}

// One-piece fit coupon: a flat annular sample for checking the measured bore size.
// Single-solid gauge coupon. Index 0/1/2 samples tight/nominal/loose diametral fit.
// The bore comes from the same function as the sleeve, and both walls are 5 mm, so this
// coupon is the sleeve with the split, flanges and print pose removed: check the bar on the
// coupon, then fit the sleeve of that index.
module clamp_gauge(index=clamp_gauge_index) {
    assert(index>=0 && index<=2, "clamp_gauge_index must be 0, 1 or 2");
    difference() {
        cylinder(d=clamp_insert_od_mm,h=3);
        translate([0,0,-0.1]) cylinder(d=clamp_insert_bore_mm(index),h=3.2);
    }
}

if (clamp_part == "anchor") clamp_anchor();
else if (clamp_part == "cap") clamp_cap();
else if (clamp_part == "insert") clamp_insert(clamp_insert_index);
else if (clamp_part == "gauge") clamp_gauge(clamp_gauge_index);
else assert(false, "clamp_part must be anchor, cap, insert or gauge");
